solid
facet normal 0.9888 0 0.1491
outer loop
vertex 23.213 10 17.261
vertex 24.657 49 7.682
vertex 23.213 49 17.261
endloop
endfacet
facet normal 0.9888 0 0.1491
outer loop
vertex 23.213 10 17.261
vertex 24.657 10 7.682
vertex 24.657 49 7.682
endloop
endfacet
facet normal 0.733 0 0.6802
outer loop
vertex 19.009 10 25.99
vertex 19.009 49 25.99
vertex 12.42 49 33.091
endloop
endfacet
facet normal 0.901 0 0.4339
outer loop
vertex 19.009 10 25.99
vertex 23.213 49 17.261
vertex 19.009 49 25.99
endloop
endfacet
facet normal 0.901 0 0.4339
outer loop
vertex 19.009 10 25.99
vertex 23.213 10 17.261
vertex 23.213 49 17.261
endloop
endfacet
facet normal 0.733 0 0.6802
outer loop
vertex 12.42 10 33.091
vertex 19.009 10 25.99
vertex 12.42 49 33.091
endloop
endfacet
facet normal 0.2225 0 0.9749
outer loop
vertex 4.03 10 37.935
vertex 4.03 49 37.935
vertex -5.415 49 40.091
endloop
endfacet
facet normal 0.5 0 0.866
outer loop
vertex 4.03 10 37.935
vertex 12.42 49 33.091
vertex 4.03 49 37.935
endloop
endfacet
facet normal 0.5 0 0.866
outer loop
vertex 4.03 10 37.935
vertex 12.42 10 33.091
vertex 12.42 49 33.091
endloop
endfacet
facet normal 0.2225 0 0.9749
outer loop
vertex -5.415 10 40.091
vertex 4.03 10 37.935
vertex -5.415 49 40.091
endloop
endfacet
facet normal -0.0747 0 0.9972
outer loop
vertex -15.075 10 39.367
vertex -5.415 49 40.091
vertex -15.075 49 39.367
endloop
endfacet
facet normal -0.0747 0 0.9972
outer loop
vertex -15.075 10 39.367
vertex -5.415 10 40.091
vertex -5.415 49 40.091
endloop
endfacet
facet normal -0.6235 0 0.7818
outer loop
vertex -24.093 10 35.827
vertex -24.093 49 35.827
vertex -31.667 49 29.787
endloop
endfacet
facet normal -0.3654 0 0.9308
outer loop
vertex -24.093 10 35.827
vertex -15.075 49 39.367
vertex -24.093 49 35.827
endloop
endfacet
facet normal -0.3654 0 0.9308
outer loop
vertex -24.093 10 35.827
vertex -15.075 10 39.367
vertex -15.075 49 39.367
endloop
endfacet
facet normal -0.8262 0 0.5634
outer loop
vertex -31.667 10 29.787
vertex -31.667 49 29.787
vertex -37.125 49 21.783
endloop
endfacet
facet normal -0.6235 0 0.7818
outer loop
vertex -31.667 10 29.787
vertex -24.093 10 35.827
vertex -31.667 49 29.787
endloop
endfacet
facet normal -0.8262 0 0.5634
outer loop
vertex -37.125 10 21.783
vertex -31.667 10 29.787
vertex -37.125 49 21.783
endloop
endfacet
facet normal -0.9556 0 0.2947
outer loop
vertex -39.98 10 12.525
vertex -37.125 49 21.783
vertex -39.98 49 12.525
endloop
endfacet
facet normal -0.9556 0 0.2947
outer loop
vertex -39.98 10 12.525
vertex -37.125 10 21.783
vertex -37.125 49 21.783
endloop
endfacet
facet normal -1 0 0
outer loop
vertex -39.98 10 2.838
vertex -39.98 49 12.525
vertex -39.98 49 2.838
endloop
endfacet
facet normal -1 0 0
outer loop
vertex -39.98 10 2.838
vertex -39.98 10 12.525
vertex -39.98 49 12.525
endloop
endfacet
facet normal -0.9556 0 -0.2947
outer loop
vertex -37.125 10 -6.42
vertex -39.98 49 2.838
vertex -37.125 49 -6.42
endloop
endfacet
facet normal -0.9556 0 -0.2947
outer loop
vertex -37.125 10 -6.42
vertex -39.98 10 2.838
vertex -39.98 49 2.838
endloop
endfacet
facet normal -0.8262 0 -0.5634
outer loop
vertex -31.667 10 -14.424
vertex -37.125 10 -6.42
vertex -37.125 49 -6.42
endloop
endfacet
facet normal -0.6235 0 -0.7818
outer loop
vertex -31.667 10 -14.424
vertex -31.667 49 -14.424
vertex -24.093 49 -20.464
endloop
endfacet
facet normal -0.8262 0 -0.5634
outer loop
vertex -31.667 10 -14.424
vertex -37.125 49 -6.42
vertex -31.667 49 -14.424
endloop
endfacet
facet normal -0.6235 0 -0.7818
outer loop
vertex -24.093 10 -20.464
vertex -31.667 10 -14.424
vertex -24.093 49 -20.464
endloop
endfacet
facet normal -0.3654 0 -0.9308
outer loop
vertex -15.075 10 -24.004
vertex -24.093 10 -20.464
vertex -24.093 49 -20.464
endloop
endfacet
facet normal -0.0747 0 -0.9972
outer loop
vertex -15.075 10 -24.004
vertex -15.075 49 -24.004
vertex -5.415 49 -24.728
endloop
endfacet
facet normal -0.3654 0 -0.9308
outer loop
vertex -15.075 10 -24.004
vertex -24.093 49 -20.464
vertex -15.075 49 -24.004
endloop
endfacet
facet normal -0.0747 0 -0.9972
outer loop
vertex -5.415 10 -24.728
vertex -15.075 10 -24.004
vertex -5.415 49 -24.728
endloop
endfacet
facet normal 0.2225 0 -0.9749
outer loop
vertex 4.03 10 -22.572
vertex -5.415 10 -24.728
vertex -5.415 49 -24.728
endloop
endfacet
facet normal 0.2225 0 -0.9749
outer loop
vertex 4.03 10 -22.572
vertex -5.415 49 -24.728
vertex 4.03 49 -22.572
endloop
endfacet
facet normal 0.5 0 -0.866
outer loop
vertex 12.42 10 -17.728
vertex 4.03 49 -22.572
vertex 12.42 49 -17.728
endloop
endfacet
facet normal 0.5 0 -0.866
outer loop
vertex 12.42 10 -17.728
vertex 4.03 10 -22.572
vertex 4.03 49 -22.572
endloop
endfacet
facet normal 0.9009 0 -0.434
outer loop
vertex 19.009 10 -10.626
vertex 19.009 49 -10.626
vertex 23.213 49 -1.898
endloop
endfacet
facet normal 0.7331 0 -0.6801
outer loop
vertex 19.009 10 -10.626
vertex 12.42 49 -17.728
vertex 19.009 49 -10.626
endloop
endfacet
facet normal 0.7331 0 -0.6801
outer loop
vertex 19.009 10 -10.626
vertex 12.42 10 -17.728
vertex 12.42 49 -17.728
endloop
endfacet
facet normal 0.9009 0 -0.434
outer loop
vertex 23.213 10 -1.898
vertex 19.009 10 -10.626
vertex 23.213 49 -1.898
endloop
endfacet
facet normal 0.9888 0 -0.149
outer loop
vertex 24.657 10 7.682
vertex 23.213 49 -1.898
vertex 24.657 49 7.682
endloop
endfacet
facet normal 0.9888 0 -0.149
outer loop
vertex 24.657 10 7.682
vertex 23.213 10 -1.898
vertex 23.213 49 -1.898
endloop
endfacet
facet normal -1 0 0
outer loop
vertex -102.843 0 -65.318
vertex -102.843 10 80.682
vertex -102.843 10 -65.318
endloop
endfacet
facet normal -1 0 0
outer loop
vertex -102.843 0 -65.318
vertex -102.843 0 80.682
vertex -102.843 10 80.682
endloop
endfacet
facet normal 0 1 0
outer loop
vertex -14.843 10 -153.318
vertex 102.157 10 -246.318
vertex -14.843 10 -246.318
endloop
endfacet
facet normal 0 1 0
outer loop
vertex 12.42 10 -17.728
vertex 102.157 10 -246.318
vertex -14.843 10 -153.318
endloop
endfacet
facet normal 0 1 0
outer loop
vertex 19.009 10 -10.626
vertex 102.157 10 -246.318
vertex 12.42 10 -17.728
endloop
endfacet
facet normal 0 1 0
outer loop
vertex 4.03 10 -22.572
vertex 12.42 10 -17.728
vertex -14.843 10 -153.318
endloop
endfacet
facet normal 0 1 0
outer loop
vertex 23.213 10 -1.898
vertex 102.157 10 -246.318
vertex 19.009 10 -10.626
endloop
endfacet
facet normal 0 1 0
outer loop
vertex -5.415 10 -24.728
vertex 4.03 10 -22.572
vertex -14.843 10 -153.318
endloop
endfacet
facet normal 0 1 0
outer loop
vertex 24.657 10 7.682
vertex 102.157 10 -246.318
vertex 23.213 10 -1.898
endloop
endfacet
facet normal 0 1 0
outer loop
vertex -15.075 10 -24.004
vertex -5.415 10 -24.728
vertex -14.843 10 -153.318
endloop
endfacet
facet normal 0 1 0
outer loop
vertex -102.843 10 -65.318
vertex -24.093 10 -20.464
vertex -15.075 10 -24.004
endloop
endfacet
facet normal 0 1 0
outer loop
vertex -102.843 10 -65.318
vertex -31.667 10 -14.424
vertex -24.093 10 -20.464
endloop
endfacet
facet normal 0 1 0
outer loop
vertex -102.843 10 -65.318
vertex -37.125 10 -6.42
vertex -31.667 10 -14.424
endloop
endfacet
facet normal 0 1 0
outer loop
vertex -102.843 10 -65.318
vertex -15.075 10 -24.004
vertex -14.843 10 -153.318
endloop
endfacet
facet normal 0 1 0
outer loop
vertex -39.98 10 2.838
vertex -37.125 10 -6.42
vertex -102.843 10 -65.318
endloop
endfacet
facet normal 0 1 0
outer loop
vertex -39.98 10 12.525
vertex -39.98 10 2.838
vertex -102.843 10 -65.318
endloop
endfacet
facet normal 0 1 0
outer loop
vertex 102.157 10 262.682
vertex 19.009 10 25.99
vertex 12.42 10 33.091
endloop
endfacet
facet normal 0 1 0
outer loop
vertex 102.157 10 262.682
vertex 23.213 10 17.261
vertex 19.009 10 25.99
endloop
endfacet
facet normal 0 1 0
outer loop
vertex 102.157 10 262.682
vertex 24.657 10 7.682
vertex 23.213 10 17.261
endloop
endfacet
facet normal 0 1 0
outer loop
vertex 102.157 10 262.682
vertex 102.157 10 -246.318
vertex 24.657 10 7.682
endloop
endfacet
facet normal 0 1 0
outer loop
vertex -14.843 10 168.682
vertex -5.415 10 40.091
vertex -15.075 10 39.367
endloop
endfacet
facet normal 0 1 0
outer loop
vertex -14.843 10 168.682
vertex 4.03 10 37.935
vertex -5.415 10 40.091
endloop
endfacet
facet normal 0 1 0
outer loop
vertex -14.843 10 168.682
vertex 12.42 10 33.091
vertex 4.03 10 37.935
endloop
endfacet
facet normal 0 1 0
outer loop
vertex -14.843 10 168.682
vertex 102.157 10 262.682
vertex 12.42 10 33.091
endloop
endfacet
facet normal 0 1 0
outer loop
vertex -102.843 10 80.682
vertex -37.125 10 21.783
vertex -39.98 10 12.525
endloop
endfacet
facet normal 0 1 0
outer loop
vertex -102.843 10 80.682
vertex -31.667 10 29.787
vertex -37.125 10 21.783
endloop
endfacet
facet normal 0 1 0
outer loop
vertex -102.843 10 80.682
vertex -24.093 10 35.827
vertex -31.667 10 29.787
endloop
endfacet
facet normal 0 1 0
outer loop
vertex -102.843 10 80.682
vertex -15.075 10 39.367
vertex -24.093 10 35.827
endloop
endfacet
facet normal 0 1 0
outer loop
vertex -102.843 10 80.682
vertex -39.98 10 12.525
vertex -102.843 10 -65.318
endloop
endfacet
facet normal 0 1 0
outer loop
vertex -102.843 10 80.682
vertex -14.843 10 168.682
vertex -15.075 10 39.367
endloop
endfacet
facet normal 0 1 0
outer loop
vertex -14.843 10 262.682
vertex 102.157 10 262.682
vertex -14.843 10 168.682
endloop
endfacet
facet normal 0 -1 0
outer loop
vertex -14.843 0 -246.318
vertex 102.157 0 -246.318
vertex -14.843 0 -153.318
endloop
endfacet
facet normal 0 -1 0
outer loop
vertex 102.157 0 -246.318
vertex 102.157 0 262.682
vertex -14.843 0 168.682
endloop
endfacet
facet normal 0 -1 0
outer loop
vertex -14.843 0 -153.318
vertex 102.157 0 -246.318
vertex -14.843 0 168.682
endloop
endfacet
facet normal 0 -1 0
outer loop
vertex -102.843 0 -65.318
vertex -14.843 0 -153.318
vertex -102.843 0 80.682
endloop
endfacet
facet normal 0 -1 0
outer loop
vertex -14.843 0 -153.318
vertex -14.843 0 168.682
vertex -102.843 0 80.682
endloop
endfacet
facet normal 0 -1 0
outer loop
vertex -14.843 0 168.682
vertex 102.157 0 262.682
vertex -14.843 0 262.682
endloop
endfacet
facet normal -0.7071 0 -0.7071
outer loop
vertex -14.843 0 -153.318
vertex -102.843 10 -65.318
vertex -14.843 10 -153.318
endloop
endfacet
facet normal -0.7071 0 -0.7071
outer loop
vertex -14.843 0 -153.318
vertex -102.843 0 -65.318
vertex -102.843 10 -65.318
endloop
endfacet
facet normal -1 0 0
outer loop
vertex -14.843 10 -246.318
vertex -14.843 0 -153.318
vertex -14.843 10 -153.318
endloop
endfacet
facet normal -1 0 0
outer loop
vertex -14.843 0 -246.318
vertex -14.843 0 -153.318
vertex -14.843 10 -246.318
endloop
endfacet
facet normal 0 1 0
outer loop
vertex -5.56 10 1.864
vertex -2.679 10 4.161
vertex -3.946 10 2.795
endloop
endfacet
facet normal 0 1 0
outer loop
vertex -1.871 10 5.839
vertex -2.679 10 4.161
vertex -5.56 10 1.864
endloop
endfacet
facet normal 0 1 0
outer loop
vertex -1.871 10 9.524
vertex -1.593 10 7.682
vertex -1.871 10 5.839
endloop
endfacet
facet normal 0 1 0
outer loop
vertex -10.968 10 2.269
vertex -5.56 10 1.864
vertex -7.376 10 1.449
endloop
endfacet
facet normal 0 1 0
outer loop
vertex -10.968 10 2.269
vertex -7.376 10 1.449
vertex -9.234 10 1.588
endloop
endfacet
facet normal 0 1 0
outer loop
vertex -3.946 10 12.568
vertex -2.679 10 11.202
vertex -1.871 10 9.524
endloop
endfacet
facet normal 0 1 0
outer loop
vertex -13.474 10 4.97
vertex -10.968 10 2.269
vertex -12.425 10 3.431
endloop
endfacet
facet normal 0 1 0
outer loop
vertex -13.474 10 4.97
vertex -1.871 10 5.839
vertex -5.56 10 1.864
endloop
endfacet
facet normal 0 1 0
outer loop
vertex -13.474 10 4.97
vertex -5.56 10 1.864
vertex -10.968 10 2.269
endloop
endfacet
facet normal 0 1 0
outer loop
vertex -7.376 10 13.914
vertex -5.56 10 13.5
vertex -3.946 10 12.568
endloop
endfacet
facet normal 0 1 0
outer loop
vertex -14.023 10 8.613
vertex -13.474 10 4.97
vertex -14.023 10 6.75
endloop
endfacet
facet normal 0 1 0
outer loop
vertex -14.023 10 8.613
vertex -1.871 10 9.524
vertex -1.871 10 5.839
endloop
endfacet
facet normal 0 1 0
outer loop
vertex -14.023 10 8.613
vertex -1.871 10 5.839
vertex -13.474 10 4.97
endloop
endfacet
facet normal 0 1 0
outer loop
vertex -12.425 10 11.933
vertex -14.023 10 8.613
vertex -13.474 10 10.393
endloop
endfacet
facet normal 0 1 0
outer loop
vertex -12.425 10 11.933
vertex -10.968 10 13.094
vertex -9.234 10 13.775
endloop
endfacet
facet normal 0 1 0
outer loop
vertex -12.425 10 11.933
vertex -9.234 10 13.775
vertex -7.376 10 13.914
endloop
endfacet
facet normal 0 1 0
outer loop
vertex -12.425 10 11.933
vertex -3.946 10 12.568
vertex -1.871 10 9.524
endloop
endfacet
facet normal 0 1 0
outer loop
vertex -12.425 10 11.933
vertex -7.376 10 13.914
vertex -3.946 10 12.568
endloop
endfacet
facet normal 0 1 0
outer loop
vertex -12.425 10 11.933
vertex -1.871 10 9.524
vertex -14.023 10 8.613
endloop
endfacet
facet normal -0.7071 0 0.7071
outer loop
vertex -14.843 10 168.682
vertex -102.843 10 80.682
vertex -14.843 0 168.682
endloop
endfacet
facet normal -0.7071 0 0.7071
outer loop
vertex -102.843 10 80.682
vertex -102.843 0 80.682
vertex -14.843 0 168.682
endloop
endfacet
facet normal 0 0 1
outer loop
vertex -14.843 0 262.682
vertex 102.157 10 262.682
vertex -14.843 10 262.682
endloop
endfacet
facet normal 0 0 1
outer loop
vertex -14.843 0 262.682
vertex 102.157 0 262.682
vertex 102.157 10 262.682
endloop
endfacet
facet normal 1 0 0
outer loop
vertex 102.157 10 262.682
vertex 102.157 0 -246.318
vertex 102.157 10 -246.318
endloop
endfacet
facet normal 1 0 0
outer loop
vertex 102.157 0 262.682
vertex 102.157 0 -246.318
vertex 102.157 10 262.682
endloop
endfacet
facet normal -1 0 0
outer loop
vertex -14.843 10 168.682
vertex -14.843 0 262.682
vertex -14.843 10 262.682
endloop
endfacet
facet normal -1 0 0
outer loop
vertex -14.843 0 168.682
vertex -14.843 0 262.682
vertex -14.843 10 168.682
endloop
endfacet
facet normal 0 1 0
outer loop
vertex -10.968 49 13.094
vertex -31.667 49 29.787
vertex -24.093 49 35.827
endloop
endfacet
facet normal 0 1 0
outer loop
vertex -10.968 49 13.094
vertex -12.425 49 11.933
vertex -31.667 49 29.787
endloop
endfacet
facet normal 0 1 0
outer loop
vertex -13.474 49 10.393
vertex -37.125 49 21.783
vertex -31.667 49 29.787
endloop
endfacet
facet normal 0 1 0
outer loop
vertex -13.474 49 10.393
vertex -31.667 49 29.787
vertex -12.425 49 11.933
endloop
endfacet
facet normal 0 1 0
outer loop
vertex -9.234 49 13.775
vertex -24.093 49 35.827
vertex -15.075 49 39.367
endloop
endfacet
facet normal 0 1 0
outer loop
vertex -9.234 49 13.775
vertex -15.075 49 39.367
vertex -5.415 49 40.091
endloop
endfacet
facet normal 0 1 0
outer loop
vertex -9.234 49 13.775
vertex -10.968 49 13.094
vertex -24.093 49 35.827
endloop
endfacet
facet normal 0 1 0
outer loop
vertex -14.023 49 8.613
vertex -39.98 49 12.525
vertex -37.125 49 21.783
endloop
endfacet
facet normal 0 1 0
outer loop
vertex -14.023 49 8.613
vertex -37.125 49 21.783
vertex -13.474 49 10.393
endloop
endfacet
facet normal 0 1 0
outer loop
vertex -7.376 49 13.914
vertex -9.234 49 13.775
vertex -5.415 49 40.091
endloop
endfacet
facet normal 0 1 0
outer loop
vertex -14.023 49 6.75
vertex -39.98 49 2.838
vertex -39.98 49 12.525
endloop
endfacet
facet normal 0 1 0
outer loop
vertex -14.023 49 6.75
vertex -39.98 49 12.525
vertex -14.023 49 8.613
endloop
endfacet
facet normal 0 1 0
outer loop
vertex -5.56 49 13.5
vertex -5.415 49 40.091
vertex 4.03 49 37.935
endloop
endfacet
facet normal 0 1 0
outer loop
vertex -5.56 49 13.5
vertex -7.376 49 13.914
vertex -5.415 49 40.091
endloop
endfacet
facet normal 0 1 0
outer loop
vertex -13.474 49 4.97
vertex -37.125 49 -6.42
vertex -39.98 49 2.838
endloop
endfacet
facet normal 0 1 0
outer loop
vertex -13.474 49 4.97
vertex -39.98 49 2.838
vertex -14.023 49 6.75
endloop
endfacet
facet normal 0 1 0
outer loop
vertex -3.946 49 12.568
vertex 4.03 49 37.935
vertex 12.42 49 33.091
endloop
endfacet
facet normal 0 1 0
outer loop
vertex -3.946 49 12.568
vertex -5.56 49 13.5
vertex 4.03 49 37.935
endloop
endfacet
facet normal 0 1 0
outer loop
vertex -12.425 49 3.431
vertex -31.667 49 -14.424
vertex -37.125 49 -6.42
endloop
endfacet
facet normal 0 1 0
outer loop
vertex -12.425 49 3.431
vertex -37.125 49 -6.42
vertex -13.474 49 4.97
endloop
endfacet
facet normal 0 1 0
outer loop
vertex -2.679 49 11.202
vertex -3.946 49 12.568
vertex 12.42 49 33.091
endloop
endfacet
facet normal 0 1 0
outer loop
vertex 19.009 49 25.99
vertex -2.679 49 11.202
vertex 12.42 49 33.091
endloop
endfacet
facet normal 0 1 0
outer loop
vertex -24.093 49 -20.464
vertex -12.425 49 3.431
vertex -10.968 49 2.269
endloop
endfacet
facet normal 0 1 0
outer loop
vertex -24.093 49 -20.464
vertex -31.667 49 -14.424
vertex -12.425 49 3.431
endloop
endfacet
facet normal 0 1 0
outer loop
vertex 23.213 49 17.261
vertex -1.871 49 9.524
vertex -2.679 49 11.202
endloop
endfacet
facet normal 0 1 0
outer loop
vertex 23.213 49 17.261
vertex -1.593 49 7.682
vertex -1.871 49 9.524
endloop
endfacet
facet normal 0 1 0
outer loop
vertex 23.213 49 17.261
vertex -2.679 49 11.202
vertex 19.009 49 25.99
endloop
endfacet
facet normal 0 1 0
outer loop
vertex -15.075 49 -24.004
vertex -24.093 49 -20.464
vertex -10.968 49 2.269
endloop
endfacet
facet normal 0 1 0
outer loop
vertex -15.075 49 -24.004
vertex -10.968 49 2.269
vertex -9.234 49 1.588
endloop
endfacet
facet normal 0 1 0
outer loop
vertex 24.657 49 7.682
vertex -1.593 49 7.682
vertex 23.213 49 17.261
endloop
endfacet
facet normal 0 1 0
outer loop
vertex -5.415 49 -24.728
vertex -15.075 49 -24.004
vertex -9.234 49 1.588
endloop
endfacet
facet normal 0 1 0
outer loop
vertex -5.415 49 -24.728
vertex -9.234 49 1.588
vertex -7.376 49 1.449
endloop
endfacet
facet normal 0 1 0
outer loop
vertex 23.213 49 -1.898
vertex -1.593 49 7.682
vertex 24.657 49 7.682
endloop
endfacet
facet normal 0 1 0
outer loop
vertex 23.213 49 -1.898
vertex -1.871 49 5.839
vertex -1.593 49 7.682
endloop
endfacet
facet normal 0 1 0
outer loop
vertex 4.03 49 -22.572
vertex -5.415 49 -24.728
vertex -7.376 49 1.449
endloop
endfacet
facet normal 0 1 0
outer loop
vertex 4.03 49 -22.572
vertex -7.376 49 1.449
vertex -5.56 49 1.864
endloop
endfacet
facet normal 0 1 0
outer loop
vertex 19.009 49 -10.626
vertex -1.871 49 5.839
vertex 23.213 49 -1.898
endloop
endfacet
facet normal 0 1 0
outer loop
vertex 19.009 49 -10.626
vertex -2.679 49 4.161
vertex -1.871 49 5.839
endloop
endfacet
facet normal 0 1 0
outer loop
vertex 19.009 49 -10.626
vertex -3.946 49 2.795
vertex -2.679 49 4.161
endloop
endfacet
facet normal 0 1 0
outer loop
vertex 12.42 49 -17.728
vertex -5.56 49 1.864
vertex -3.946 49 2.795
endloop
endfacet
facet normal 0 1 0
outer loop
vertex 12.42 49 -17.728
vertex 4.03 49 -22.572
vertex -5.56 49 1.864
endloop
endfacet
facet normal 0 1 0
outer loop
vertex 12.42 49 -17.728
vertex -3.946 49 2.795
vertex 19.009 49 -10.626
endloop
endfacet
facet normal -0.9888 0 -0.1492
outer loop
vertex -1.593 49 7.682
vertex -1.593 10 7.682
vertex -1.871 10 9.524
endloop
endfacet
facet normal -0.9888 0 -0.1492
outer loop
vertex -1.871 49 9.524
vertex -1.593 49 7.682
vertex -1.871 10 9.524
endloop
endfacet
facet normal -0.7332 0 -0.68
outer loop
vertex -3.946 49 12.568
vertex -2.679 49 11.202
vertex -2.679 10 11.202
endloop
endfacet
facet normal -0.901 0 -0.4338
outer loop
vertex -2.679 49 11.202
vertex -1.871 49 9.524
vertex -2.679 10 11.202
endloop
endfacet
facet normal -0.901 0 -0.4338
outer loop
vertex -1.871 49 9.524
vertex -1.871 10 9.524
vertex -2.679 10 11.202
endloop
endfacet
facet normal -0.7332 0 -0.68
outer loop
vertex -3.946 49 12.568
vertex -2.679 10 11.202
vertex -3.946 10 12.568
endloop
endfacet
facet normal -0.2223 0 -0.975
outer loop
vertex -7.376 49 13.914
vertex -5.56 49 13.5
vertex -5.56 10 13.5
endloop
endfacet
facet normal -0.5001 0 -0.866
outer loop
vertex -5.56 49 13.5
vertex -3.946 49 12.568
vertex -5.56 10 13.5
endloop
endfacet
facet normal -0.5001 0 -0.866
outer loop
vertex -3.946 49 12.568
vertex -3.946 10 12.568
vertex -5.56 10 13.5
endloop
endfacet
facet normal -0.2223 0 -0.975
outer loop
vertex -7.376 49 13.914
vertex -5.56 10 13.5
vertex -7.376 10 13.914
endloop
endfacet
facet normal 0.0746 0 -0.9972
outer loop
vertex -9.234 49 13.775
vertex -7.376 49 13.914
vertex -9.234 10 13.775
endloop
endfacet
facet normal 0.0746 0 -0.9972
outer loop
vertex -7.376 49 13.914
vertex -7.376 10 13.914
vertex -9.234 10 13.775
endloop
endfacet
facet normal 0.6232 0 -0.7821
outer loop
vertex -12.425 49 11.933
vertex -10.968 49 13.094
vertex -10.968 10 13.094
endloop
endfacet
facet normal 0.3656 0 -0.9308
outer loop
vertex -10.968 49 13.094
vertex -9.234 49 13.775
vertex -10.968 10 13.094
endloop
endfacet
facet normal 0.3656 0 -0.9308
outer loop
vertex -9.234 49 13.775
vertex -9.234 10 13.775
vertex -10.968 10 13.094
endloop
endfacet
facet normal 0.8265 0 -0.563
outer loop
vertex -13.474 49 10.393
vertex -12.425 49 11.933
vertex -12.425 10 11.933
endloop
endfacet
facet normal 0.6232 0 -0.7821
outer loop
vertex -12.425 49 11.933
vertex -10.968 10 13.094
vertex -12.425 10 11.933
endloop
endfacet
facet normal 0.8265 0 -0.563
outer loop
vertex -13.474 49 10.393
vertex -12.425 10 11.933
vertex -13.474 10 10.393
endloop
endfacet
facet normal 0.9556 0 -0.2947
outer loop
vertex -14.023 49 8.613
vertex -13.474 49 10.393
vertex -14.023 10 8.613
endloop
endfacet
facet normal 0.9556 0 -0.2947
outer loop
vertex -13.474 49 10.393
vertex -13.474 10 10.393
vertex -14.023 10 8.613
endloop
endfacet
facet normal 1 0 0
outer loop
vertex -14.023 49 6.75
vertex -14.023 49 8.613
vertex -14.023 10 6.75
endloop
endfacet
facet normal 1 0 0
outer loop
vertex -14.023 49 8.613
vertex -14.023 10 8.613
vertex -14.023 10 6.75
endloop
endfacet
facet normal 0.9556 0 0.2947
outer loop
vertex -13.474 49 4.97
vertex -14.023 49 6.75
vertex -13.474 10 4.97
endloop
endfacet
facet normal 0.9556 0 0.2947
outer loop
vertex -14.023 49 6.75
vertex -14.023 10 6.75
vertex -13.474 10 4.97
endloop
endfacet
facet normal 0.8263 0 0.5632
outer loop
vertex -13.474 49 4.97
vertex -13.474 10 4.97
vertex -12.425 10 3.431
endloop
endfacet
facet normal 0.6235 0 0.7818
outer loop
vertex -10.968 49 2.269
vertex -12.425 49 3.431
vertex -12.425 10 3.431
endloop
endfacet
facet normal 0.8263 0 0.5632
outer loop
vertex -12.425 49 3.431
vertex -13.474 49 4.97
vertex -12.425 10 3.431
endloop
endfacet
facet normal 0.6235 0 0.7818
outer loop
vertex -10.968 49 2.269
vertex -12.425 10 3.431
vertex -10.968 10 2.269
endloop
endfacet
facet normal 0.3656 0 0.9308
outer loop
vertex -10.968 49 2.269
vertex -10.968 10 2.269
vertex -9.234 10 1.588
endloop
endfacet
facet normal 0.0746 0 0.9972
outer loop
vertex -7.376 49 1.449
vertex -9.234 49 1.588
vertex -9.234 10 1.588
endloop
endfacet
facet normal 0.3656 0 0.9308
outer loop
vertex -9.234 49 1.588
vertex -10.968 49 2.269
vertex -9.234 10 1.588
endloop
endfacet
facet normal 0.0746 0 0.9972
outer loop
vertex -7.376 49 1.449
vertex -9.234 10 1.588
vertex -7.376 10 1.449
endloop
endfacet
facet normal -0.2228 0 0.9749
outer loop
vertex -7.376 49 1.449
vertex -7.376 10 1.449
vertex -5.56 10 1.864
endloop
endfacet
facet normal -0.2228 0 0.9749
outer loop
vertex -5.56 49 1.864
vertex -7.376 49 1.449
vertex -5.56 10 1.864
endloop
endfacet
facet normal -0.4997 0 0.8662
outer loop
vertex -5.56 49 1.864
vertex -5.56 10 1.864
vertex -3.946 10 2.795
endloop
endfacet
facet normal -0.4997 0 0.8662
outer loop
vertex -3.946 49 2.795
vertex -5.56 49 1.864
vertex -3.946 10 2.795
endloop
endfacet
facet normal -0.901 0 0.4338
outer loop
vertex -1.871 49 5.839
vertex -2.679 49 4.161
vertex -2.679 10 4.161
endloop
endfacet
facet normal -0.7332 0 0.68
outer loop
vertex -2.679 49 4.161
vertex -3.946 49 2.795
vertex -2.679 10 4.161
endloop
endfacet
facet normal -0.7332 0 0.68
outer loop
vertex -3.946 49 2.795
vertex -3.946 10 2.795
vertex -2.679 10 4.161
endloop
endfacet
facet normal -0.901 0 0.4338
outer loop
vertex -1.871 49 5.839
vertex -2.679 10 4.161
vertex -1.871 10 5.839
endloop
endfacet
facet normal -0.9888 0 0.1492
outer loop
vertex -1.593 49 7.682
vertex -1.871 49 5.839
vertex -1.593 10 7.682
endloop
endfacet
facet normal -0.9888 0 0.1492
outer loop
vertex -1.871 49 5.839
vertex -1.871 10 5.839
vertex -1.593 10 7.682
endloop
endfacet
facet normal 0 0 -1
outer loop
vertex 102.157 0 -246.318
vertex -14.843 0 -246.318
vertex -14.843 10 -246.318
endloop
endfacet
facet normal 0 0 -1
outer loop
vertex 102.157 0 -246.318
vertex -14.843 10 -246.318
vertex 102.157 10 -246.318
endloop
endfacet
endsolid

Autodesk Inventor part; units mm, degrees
ref_plane "YZ Plane" through (0, 0, 0) normal (1, 0, 0) x (0, 1, 0)
ref_plane "XZ Plane" through (0, 0, 0) normal (0, 1, 0) x (-1, 0, 0)
ref_plane "XY Plane" through (0, 0, 0) normal (0, 0, 1) x (1, 0, 0)
sketch "Sketch1" plane through (0, 0, 0) normal (0, 1, 0) x (-1, 0, 0)
  line L0 (-102.1567, -250.3174) -> (-102.1567, 267.6805)
  line L1 (-102.1567, -246.3184) -> (-102.1567, 262.6816)
  line L2 (-102.1567, 262.6816) -> (14.8433, 262.6816)
  line L3 (102.8433, 80.6816) -> (14.8433, 168.6816)
  line L4 (14.8433, 262.6816) -> (14.8433, 168.6816)
  line L5 (14.8433, 168.6816) -> (102.8433, 80.6816)
  line L6 (102.8433, 80.6816) -> (102.8433, -65.3184)
  line L7 (102.8433, -65.3184) -> (14.8433, -153.3184)
  line L8 (14.8433, -153.3184) -> (14.8433, -246.3184)
  line L9 (14.8433, -246.3184) -> (-102.1567, -246.3184)
  point P0 (0, 0)
  point P1 (-37.1567, -11.3184)
  dimension "d0" = 509
  dimension "d1" = 117
  dimension "d2" = 117
  dimension "d3" = 93
  dimension "d4" = 94
  dimension "d6" = 88
  dimension "d7" = 88
  dimension "d8" = 88
  dimension "d9" = 88
extrude "Extrusion1" add sketch "Sketch1" along normal blind 10
sketch "Sketch2" plane through (0, 10, 0) normal (0, 1, 0) x (1, 0, 0)
  line L0 (-102.8433, 65.3184) -> (-102.8433, -80.6816) projected
  circle A0 centre (-102.8433, -7.6816) radius 9.3184
  circle A1 centre (-7.8433, -7.6816) radius 32.5
  circle A2 centre (-7.8433, -7.6816) radius 6.25
  line L1 (102.1567, -262.6816) -> (102.1567, 246.3184) projected
  line L2 (102.1567, 246.3184) -> (-14.8433, 246.3184) projected
  point P0 (0, 0)
  dimension "d14" = 95
  dimension "d16" = 254
  dimension "d17" = 110
  dimension "d18" = 65
  dimension "d19" = 12.5
extrude "Extrusion2" add sketch "Sketch2" along normal blind 39 contours A1
properties part number "XAxisCreplCaretki" material "Aluminum 6061"
